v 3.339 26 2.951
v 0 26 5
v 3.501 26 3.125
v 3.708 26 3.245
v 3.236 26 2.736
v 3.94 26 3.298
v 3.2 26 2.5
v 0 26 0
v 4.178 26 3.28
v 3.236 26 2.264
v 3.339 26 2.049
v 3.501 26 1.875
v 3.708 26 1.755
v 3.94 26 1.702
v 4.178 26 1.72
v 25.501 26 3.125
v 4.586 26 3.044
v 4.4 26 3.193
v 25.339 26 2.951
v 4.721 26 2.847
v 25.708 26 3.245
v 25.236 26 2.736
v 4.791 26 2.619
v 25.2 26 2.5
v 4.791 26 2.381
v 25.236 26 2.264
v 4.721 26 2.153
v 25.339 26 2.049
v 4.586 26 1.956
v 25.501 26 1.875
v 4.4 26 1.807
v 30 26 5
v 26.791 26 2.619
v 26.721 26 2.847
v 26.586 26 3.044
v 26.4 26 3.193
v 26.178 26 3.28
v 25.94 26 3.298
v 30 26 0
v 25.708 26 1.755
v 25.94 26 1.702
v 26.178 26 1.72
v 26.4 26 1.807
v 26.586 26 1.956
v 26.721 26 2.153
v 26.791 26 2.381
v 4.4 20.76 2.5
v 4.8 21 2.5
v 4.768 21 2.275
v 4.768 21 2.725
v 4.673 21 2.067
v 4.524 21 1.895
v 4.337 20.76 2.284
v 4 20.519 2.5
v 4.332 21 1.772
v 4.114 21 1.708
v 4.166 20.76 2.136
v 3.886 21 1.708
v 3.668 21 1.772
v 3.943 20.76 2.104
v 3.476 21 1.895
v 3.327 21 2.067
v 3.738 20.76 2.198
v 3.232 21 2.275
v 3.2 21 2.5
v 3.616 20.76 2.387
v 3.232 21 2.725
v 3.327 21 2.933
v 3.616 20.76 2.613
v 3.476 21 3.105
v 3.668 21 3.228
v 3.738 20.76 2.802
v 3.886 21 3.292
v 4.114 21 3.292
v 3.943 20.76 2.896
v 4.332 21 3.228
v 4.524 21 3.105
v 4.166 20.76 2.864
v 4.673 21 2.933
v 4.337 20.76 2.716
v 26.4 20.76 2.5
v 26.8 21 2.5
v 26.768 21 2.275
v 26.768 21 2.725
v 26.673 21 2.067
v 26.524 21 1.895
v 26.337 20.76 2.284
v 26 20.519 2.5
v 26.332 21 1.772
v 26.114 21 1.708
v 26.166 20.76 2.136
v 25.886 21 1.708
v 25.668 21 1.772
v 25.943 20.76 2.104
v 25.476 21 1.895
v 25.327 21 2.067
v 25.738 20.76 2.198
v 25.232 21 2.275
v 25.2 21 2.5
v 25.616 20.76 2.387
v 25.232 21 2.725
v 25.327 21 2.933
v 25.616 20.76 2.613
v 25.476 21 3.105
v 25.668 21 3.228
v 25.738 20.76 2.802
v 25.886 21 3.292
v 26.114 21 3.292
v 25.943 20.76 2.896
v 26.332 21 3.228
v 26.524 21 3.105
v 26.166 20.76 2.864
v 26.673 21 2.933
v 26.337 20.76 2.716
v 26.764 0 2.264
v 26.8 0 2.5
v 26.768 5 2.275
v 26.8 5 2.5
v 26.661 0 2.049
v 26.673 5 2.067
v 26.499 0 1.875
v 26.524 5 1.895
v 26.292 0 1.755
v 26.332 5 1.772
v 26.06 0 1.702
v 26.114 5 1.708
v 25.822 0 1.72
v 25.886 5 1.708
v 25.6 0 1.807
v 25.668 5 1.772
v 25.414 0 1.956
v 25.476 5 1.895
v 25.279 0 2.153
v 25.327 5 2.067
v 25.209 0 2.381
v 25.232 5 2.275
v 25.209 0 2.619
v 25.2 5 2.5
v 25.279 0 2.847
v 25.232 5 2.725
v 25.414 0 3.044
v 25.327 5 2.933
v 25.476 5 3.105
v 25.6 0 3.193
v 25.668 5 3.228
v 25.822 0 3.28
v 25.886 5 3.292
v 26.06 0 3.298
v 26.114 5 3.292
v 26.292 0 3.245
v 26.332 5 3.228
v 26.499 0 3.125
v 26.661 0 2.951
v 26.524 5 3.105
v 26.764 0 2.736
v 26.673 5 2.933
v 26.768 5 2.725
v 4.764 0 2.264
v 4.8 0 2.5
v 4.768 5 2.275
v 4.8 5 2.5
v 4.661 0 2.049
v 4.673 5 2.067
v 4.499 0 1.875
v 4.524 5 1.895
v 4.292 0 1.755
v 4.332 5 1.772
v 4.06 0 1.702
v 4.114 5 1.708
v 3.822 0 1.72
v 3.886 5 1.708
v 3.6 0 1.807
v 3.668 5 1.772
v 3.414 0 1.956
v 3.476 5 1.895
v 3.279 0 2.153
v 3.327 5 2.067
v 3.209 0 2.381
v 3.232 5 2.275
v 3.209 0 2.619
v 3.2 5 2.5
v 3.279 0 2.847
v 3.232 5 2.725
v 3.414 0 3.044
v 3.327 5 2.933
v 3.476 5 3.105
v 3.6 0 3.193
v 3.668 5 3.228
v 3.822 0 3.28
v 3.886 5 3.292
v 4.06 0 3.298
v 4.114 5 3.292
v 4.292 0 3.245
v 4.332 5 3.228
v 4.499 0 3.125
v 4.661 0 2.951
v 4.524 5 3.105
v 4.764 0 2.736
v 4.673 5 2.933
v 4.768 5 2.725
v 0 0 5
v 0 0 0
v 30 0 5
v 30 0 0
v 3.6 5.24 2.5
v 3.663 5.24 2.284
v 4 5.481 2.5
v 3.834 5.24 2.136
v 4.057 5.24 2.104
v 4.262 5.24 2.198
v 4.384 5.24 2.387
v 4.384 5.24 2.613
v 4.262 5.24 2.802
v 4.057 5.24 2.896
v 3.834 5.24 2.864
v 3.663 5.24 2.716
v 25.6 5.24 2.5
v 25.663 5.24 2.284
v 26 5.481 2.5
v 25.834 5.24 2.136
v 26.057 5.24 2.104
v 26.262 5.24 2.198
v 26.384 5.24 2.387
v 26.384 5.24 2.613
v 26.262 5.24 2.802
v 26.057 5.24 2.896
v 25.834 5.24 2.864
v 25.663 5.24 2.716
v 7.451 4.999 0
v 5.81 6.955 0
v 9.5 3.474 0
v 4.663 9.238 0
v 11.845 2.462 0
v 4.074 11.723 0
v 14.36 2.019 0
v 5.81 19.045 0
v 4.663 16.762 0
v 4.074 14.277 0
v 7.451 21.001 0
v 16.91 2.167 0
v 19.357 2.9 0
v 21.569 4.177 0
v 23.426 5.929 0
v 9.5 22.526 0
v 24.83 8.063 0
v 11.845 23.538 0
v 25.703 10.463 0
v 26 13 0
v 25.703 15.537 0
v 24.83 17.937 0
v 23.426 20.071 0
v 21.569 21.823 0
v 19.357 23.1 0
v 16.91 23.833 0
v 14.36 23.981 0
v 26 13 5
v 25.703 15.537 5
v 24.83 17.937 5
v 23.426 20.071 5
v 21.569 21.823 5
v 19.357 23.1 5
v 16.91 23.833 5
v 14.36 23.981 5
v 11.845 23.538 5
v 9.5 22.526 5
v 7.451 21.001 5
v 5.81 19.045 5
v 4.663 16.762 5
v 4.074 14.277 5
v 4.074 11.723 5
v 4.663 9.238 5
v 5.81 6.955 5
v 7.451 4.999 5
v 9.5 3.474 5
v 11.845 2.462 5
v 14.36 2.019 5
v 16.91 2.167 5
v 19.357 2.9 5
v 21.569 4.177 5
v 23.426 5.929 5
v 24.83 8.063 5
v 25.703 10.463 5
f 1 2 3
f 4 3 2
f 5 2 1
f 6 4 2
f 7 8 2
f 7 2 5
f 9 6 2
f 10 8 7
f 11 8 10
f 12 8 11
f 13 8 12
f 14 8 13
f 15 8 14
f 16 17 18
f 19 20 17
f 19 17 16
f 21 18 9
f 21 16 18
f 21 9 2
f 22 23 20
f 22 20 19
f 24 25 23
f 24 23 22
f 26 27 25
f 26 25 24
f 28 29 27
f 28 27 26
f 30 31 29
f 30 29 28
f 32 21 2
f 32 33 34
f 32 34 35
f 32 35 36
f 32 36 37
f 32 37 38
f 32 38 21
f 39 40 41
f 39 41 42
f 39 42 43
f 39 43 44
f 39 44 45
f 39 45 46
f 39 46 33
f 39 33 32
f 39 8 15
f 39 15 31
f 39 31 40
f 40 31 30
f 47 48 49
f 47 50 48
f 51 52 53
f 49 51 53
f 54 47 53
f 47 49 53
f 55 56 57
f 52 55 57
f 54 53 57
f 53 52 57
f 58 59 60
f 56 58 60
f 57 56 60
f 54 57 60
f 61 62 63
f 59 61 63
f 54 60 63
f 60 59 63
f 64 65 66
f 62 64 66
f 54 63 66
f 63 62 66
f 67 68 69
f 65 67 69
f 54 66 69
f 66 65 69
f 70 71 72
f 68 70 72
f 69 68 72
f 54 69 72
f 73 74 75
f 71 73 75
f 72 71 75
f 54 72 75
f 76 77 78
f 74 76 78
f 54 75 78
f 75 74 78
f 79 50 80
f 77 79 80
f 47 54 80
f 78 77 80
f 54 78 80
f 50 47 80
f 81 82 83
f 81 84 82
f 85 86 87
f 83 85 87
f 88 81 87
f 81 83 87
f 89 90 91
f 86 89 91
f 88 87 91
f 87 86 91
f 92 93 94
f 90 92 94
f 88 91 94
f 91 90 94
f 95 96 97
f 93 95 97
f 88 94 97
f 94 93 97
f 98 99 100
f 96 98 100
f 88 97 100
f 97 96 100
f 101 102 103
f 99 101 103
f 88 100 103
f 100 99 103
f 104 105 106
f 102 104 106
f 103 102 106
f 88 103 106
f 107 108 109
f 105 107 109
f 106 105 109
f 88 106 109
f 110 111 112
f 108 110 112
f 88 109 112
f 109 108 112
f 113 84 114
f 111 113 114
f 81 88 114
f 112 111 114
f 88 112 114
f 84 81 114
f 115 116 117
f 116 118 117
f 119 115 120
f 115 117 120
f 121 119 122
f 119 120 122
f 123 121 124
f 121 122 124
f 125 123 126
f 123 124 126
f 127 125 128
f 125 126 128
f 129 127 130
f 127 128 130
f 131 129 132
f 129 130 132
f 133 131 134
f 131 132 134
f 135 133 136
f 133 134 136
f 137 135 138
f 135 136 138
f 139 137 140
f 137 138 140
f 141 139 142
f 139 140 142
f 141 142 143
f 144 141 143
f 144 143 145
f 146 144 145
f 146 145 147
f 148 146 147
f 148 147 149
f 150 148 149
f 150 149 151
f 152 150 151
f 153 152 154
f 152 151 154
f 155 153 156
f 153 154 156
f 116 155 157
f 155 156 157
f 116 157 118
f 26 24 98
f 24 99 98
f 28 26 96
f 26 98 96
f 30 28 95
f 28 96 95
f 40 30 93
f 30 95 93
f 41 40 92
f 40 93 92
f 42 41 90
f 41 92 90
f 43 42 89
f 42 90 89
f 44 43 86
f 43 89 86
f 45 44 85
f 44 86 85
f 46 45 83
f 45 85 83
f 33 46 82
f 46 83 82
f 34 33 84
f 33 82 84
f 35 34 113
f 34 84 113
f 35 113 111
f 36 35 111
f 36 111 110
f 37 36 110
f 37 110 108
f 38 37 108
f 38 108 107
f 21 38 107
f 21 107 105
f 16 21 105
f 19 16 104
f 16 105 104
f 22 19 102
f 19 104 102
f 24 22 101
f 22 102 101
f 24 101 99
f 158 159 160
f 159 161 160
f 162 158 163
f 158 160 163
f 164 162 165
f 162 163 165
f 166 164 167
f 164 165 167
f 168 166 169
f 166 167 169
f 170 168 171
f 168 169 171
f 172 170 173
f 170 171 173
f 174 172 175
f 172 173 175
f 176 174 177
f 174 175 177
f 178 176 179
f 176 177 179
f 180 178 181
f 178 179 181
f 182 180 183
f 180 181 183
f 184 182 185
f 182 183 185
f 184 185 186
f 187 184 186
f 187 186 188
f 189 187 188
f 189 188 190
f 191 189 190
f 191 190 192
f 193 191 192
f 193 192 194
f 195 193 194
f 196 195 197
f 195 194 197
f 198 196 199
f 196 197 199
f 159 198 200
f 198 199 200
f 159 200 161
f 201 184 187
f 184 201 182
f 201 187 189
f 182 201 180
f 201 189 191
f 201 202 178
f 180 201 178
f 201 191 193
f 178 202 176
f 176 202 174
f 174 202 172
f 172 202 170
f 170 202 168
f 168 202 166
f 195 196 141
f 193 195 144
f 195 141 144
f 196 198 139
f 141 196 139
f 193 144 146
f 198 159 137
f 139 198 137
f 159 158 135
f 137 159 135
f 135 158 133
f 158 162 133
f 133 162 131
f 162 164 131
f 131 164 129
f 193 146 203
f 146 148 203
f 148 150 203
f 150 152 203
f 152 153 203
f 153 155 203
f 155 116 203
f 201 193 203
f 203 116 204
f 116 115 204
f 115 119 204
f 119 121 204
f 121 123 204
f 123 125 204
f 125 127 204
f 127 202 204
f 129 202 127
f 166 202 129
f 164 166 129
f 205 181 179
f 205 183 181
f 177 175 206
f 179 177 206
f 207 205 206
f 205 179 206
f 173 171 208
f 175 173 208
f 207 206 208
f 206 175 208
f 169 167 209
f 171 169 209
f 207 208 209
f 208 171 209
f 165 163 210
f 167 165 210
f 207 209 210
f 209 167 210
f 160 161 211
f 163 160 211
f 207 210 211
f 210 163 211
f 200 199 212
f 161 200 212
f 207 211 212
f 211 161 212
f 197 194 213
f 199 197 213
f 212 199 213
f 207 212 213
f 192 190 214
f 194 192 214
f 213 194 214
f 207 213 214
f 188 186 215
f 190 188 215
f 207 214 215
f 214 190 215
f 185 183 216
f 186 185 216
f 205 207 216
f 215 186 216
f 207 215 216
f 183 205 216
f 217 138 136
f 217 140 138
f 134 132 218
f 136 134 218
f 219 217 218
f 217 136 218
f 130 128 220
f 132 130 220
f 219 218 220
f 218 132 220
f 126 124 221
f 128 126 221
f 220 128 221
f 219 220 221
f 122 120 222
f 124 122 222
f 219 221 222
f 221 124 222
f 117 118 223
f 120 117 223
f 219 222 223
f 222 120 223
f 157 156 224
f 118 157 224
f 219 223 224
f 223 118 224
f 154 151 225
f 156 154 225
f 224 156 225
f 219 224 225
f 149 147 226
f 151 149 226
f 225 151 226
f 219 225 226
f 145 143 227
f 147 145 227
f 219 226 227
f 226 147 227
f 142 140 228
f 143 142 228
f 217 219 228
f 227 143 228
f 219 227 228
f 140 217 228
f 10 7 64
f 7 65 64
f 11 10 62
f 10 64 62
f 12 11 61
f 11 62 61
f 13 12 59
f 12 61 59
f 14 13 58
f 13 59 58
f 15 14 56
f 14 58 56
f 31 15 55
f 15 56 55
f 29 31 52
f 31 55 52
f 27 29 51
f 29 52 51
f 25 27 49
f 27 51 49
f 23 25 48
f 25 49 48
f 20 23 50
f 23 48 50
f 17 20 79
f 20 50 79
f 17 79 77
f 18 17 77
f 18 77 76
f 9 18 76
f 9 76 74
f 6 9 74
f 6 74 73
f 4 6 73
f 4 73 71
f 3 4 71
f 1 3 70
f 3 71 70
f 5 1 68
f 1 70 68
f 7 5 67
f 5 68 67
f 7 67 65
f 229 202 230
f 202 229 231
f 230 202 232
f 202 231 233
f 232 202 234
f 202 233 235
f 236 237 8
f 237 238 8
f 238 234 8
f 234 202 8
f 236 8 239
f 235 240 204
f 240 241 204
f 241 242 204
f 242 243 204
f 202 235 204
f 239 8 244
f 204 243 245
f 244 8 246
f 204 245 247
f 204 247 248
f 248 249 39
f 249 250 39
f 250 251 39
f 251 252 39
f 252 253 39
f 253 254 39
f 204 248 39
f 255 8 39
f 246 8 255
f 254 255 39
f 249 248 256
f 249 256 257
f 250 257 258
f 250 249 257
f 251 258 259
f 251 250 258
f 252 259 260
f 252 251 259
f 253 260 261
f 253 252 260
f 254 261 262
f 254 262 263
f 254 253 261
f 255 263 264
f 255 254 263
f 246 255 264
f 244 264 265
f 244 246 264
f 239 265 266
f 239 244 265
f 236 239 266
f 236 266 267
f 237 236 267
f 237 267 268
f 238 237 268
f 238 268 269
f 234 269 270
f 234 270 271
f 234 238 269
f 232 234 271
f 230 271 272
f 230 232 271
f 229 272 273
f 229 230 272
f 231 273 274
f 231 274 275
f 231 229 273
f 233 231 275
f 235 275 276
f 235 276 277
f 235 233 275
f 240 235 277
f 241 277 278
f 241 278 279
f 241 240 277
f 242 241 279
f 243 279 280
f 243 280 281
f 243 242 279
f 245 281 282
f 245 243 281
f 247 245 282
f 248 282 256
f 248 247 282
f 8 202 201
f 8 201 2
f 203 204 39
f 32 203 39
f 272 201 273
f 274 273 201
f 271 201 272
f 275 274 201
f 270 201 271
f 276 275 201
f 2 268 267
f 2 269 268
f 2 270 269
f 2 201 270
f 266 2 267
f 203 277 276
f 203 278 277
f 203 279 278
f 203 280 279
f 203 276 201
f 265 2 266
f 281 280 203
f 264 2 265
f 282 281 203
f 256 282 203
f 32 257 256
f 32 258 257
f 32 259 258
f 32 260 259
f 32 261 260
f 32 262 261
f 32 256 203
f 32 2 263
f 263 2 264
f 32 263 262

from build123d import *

# Parameters (mm, degrees)
ESQUISSE1_W                                   = 30
ESQUISSE1_H                                   = 26
ESQUISSE1_R                                   = 11
BOSS_EXTRU_1_DEPTH                            = 5
TROU_POUR_TARAUDAGE_POUR_TROU_TARAUD_M2_D     = 1.6
TROU_POUR_TARAUDAGE_POUR_TROU_TARAUD_M2_DEPTH = 5
TROU_POUR_TARAUDAGE_POUR_TROU_TARAUD_M2_TIP   = 0.480688495
TROU_POUR_TARAUDAGE_POUR_TROU_TARAUD_2_D      = 1.6
TROU_POUR_TARAUDAGE_POUR_TROU_TARAUD_2_DEPTH  = 5
TROU_POUR_TARAUDAGE_POUR_TROU_TARAUD_2_TIP    = 0.480688495


with BuildPart() as part:
    # Esquisse1 → Boss.-Extru.1 (new body)
    with BuildSketch(Plane.XY):
        with Locations((15, 13)):
            Rectangle(ESQUISSE1_W, ESQUISSE1_H)
        with Locations((15, 13)):
            Circle(ESQUISSE1_R, mode=Mode.SUBTRACT)
    extrude(amount=BOSS_EXTRU_1_DEPTH)

    # Trou pour taraudage pour trou taraud_ M2
    with Locations(Plane(origin=(0, 26, 0), x_dir=(1, 0, 0), z_dir=(0, 1, 0))):
        with Locations((4, -2.5), (26, -2.5)):
            Hole(TROU_POUR_TARAUDAGE_POUR_TROU_TARAUD_M2_D / 2, depth=TROU_POUR_TARAUDAGE_POUR_TROU_TARAUD_M2_DEPTH)
            with Locations((0, 0, -(TROU_POUR_TARAUDAGE_POUR_TROU_TARAUD_M2_DEPTH + TROU_POUR_TARAUDAGE_POUR_TROU_TARAUD_M2_TIP / 2))):  # 118° drill point
                Cone(0, TROU_POUR_TARAUDAGE_POUR_TROU_TARAUD_M2_D / 2, TROU_POUR_TARAUDAGE_POUR_TROU_TARAUD_M2_TIP, mode=Mode.SUBTRACT)

    # Trou pour taraudage pour trou taraud 2
    with Locations(Plane(origin=(0, 0, 0), x_dir=(-1, 0, 0), z_dir=(0, -1, 0))):
        with Locations((-4, -2.5), (-26, -2.5)):
            Hole(TROU_POUR_TARAUDAGE_POUR_TROU_TARAUD_2_D / 2, depth=TROU_POUR_TARAUDAGE_POUR_TROU_TARAUD_2_DEPTH)
            with Locations((0, 0, -(TROU_POUR_TARAUDAGE_POUR_TROU_TARAUD_2_DEPTH + TROU_POUR_TARAUDAGE_POUR_TROU_TARAUD_2_TIP / 2))):  # 118° drill point
                Cone(0, TROU_POUR_TARAUDAGE_POUR_TROU_TARAUD_2_D / 2, TROU_POUR_TARAUDAGE_POUR_TROU_TARAUD_2_TIP, mode=Mode.SUBTRACT)


solid = part.part
